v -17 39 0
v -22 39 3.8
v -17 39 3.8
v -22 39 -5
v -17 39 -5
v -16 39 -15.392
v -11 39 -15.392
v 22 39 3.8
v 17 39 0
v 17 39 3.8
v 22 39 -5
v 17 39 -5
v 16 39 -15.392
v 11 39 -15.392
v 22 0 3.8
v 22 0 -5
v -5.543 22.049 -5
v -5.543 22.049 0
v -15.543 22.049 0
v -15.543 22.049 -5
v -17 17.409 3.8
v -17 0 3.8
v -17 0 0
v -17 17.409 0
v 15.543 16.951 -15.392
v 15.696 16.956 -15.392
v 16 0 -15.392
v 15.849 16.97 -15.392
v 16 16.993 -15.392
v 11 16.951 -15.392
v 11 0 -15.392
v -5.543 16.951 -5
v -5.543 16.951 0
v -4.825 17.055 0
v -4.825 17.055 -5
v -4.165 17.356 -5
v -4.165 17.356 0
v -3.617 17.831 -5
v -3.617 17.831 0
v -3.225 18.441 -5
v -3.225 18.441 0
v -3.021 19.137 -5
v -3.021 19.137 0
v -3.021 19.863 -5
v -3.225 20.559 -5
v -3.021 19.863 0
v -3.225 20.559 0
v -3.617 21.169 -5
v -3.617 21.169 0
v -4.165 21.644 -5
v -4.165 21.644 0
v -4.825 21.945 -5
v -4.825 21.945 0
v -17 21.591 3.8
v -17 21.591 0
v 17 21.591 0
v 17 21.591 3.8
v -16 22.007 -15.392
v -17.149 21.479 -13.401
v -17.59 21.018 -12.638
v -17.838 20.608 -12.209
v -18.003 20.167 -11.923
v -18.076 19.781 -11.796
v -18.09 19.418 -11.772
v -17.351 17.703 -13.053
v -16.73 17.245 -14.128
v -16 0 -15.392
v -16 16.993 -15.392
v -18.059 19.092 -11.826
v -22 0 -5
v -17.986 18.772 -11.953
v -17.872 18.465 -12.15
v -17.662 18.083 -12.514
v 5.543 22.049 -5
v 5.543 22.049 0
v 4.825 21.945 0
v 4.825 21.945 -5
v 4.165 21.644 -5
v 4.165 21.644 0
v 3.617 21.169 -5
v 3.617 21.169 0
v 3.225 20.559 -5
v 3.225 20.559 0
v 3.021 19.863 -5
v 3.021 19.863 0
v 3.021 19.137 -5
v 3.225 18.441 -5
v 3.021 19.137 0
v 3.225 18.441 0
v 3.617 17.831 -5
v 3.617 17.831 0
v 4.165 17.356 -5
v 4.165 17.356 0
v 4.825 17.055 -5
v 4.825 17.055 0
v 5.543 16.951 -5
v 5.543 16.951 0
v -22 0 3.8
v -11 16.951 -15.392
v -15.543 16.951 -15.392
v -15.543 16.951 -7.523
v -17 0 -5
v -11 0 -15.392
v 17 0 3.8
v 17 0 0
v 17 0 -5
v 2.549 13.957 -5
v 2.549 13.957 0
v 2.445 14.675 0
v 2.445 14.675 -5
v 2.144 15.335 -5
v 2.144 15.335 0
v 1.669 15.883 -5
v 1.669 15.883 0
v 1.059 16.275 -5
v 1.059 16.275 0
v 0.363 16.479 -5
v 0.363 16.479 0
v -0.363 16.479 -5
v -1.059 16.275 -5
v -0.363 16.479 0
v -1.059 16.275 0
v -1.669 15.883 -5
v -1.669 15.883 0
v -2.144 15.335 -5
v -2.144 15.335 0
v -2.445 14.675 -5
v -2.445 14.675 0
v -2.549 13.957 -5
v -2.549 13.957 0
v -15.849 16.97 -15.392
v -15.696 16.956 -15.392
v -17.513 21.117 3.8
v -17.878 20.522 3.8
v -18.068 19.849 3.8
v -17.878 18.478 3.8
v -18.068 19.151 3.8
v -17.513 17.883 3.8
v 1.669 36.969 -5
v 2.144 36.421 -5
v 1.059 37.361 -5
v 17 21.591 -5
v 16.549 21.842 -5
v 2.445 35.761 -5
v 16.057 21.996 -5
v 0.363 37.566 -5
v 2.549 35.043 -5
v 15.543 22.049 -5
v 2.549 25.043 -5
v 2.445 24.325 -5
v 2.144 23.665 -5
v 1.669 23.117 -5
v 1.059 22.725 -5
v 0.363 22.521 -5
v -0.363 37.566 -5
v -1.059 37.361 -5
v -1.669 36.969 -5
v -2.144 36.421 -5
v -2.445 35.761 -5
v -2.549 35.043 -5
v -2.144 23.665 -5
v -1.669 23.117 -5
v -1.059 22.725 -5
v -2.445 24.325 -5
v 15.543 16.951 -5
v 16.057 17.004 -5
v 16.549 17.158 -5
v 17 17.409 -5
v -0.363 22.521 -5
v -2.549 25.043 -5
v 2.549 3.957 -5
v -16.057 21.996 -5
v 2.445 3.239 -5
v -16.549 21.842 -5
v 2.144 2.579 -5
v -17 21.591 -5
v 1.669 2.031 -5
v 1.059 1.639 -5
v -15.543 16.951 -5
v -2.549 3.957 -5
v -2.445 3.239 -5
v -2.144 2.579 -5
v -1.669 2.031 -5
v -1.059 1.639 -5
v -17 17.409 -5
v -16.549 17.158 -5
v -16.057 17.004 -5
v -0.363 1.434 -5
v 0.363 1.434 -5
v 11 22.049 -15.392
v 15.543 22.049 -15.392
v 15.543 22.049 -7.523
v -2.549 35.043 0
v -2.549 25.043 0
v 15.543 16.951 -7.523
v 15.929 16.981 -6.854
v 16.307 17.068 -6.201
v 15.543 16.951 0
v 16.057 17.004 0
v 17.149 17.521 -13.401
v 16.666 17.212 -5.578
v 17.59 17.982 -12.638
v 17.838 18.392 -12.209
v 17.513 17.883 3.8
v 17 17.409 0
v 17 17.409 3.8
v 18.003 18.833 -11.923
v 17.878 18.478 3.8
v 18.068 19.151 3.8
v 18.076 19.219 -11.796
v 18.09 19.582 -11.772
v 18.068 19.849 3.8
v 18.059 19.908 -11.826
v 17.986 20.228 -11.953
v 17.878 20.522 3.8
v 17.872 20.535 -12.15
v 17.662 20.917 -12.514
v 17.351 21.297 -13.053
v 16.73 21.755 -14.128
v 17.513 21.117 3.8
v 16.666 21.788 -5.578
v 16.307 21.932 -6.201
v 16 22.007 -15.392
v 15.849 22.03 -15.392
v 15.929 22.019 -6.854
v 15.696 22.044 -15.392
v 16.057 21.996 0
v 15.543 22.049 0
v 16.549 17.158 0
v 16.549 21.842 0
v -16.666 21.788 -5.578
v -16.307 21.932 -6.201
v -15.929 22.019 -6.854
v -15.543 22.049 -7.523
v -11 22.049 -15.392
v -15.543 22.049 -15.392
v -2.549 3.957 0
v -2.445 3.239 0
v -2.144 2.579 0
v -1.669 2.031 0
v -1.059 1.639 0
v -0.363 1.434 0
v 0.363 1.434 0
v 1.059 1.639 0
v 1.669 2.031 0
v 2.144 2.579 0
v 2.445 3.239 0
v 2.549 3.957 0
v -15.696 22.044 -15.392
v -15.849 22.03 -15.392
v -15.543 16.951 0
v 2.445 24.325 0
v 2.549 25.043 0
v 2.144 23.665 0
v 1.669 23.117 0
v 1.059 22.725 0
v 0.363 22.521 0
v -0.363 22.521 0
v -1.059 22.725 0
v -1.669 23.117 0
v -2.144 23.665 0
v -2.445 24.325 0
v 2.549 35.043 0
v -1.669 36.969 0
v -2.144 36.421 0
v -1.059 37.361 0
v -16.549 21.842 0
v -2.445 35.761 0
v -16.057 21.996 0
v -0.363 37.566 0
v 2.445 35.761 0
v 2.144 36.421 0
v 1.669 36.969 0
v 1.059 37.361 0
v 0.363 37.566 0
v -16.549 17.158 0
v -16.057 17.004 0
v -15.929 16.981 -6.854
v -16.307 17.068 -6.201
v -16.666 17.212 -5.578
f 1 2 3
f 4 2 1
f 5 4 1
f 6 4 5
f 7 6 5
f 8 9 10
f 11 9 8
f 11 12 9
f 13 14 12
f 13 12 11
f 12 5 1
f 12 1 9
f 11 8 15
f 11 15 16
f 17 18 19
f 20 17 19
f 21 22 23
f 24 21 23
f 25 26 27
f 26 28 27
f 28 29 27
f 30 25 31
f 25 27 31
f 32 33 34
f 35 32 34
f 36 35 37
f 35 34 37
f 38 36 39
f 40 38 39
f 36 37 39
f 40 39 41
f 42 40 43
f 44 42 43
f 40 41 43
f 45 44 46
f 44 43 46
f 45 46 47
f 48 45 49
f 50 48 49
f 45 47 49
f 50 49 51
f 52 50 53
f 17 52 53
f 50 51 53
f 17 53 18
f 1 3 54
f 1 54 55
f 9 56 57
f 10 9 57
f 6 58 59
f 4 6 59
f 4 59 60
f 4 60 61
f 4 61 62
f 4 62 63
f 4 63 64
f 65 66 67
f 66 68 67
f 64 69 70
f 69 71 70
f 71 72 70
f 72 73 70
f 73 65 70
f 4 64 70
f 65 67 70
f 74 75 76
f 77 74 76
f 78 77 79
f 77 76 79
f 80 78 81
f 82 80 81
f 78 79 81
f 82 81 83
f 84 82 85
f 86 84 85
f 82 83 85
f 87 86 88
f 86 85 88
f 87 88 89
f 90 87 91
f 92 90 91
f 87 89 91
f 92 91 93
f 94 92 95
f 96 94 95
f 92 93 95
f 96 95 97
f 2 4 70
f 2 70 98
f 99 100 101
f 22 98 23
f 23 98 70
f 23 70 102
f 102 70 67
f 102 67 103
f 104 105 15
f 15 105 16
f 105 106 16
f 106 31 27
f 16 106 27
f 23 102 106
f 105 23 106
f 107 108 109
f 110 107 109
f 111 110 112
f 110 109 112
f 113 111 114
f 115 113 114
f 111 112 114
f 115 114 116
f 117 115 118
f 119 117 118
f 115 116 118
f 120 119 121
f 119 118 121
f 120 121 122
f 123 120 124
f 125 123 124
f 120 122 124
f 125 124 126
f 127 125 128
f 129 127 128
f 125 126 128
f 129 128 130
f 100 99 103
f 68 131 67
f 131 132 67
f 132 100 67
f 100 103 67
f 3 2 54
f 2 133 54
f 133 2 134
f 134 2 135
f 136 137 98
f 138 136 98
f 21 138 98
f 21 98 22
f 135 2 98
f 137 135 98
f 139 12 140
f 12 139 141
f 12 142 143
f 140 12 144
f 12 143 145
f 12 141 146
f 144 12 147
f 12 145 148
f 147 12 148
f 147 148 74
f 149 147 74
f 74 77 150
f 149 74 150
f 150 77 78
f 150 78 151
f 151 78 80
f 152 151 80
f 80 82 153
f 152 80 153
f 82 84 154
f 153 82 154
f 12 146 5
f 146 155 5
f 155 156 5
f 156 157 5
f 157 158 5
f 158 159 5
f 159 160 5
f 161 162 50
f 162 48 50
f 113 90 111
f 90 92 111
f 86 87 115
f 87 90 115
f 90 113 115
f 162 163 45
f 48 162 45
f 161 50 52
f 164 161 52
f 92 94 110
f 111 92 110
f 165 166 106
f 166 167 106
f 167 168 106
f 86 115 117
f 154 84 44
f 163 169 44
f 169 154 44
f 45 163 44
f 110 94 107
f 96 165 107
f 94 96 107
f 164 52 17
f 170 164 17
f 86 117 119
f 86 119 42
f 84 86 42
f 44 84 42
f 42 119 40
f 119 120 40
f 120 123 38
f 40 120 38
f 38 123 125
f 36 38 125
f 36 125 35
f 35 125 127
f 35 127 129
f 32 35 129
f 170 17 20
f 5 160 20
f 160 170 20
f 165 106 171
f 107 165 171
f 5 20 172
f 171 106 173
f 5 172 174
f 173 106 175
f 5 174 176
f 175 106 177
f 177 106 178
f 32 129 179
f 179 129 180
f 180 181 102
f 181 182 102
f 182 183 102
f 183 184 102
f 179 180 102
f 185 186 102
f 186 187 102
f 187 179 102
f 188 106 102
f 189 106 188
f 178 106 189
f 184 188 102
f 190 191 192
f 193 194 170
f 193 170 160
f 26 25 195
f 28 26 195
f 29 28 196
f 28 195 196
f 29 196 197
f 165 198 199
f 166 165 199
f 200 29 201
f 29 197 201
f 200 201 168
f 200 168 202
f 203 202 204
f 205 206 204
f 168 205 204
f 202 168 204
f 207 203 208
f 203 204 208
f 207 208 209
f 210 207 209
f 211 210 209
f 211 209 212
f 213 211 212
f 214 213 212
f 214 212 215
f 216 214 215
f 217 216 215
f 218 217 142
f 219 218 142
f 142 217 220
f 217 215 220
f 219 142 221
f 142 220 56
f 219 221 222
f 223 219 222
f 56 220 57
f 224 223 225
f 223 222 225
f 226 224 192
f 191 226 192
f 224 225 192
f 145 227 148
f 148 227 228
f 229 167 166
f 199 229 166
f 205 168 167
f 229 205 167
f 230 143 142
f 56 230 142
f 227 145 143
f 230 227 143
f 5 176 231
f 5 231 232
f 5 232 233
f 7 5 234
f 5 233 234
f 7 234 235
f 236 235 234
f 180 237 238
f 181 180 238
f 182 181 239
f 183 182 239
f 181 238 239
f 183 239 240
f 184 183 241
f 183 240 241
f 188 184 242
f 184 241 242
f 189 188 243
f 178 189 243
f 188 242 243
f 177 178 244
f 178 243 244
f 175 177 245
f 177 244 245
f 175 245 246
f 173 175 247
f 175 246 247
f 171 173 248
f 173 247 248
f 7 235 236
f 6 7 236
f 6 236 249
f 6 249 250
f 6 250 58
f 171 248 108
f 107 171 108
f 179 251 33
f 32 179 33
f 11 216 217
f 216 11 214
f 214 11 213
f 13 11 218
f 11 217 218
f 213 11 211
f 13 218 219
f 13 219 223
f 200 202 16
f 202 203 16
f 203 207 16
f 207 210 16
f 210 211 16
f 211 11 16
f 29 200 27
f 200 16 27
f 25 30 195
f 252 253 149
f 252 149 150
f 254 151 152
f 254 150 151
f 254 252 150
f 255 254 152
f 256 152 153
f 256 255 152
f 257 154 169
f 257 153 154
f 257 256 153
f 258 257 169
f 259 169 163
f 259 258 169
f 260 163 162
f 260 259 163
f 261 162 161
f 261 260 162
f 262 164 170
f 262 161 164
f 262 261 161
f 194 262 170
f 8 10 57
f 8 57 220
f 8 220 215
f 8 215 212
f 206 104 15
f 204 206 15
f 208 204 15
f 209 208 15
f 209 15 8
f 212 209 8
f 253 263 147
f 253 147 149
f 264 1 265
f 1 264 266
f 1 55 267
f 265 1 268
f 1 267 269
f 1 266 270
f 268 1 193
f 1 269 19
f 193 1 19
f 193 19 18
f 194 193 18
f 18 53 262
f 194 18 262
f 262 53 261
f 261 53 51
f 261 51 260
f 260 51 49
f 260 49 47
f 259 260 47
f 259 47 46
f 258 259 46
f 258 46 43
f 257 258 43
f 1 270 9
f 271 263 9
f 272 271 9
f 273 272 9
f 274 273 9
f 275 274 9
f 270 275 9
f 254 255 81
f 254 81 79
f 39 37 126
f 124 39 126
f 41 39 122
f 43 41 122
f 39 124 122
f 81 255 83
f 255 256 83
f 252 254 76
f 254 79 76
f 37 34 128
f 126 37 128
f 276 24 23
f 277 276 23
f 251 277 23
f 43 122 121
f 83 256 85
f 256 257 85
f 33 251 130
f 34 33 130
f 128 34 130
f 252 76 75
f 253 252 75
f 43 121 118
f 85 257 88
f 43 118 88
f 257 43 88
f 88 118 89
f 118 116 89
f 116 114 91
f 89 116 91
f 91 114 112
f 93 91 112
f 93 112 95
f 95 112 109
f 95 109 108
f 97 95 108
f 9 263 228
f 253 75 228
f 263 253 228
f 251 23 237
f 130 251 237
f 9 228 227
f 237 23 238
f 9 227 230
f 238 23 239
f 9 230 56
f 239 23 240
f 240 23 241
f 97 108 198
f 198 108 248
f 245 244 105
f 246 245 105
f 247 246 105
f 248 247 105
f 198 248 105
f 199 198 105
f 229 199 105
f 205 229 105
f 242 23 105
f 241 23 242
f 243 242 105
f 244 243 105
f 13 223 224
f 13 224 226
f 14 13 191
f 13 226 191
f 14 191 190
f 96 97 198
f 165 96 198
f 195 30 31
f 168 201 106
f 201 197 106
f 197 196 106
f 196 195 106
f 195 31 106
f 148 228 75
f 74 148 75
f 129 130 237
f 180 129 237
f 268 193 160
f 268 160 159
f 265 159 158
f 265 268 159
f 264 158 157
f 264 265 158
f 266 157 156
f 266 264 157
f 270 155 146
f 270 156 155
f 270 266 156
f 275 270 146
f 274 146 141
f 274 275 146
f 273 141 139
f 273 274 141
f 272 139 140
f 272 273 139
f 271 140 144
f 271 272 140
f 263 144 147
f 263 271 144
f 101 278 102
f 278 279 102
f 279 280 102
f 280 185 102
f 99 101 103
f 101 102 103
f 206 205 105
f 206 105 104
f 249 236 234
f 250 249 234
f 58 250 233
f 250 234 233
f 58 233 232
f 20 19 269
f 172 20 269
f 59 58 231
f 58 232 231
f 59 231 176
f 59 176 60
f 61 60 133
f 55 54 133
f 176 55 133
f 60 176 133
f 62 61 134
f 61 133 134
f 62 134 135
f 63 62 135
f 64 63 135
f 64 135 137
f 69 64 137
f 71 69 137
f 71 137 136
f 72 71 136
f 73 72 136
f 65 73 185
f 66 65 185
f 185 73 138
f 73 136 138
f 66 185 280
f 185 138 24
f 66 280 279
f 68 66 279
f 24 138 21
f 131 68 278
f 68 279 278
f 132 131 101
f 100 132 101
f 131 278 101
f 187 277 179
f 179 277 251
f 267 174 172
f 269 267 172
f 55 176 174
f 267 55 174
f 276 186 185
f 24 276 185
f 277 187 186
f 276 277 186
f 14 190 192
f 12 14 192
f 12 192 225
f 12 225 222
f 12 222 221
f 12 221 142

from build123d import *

# Parameters (mm, degrees)
EXTRUDE_1_DEPTH     = 39
CUT_EXTRUDE_1_DEPTH = 49.716984362


with BuildPart() as part:
    # 草图1 → 凸台-拉伸1 (new body)
    with BuildSketch(Plane(origin=(0, 0, 0), x_dir=(1, 0, 0), z_dir=(0, 1, 0))):
        Polygon((-22, 0), (-22, -3.8), (-17, -3.8), (-17, 0), (17, 0), (17, -3.8), (22, -3.8), (22, 0), (22, 5), (16, 15.392304845), (11, 15.392304845), (17, 5), (-17, 5), (-11, 15.392304845), (-16, 15.392304845), (-22, 5), align=None)
    extrude(amount=EXTRUDE_1_DEPTH)

    # 草图2 → 切除-拉伸1 (cut, through all)
    with BuildSketch(Plane.XY.offset(3.8)):
        with BuildLine():
            Line((-2.548549229, 25.043167775), (-2.548549229, 35.043167775))
            ThreePointArc((-2.548549229, 35.043167775), (0, 37.591717003), (2.548549229, 35.043167775))
            Line((2.548549229, 35.043167775), (2.548549229, 25.043167775))
            ThreePointArc((2.548549229, 25.043167775), (0, 22.494618546), (-2.548549229, 25.043167775))
        make_face()
        with BuildLine():
            Line((5.543167775, 16.951450771), (15.543167775, 16.951450771))
            ThreePointArc((15.543167775, 16.951450771), (18.091717003, 19.5), (15.543167775, 22.048549229))
            Line((15.543167775, 22.048549229), (5.543167775, 22.048549229))
            ThreePointArc((5.543167775, 22.048549229), (2.994618546, 19.5), (5.543167775, 16.951450771))
        make_face()
        with BuildLine():
            Line((-2.548549229, 13.956832225), (-2.548549229, 3.956832225))
            ThreePointArc((-2.548549229, 3.956832225), (0, 1.408282997), (2.548549229, 3.956832225))
            Line((2.548549229, 3.956832225), (2.548549229, 13.956832225))
            ThreePointArc((2.548549229, 13.956832225), (0, 16.505381454), (-2.548549229, 13.956832225))
        make_face()
        with BuildLine():
            Line((-5.543167775, 22.048549229), (-15.543167775, 22.048549229))
            ThreePointArc((-15.543167775, 22.048549229), (-18.091717003, 19.5), (-15.543167775, 16.951450771))
            Line((-15.543167775, 16.951450771), (-5.543167775, 16.951450771))
            ThreePointArc((-5.543167775, 16.951450771), (-2.994618546, 19.5), (-5.543167775, 22.048549229))
        make_face()
    extrude(amount=-CUT_EXTRUDE_1_DEPTH, mode=Mode.SUBTRACT)


solid = part.part
